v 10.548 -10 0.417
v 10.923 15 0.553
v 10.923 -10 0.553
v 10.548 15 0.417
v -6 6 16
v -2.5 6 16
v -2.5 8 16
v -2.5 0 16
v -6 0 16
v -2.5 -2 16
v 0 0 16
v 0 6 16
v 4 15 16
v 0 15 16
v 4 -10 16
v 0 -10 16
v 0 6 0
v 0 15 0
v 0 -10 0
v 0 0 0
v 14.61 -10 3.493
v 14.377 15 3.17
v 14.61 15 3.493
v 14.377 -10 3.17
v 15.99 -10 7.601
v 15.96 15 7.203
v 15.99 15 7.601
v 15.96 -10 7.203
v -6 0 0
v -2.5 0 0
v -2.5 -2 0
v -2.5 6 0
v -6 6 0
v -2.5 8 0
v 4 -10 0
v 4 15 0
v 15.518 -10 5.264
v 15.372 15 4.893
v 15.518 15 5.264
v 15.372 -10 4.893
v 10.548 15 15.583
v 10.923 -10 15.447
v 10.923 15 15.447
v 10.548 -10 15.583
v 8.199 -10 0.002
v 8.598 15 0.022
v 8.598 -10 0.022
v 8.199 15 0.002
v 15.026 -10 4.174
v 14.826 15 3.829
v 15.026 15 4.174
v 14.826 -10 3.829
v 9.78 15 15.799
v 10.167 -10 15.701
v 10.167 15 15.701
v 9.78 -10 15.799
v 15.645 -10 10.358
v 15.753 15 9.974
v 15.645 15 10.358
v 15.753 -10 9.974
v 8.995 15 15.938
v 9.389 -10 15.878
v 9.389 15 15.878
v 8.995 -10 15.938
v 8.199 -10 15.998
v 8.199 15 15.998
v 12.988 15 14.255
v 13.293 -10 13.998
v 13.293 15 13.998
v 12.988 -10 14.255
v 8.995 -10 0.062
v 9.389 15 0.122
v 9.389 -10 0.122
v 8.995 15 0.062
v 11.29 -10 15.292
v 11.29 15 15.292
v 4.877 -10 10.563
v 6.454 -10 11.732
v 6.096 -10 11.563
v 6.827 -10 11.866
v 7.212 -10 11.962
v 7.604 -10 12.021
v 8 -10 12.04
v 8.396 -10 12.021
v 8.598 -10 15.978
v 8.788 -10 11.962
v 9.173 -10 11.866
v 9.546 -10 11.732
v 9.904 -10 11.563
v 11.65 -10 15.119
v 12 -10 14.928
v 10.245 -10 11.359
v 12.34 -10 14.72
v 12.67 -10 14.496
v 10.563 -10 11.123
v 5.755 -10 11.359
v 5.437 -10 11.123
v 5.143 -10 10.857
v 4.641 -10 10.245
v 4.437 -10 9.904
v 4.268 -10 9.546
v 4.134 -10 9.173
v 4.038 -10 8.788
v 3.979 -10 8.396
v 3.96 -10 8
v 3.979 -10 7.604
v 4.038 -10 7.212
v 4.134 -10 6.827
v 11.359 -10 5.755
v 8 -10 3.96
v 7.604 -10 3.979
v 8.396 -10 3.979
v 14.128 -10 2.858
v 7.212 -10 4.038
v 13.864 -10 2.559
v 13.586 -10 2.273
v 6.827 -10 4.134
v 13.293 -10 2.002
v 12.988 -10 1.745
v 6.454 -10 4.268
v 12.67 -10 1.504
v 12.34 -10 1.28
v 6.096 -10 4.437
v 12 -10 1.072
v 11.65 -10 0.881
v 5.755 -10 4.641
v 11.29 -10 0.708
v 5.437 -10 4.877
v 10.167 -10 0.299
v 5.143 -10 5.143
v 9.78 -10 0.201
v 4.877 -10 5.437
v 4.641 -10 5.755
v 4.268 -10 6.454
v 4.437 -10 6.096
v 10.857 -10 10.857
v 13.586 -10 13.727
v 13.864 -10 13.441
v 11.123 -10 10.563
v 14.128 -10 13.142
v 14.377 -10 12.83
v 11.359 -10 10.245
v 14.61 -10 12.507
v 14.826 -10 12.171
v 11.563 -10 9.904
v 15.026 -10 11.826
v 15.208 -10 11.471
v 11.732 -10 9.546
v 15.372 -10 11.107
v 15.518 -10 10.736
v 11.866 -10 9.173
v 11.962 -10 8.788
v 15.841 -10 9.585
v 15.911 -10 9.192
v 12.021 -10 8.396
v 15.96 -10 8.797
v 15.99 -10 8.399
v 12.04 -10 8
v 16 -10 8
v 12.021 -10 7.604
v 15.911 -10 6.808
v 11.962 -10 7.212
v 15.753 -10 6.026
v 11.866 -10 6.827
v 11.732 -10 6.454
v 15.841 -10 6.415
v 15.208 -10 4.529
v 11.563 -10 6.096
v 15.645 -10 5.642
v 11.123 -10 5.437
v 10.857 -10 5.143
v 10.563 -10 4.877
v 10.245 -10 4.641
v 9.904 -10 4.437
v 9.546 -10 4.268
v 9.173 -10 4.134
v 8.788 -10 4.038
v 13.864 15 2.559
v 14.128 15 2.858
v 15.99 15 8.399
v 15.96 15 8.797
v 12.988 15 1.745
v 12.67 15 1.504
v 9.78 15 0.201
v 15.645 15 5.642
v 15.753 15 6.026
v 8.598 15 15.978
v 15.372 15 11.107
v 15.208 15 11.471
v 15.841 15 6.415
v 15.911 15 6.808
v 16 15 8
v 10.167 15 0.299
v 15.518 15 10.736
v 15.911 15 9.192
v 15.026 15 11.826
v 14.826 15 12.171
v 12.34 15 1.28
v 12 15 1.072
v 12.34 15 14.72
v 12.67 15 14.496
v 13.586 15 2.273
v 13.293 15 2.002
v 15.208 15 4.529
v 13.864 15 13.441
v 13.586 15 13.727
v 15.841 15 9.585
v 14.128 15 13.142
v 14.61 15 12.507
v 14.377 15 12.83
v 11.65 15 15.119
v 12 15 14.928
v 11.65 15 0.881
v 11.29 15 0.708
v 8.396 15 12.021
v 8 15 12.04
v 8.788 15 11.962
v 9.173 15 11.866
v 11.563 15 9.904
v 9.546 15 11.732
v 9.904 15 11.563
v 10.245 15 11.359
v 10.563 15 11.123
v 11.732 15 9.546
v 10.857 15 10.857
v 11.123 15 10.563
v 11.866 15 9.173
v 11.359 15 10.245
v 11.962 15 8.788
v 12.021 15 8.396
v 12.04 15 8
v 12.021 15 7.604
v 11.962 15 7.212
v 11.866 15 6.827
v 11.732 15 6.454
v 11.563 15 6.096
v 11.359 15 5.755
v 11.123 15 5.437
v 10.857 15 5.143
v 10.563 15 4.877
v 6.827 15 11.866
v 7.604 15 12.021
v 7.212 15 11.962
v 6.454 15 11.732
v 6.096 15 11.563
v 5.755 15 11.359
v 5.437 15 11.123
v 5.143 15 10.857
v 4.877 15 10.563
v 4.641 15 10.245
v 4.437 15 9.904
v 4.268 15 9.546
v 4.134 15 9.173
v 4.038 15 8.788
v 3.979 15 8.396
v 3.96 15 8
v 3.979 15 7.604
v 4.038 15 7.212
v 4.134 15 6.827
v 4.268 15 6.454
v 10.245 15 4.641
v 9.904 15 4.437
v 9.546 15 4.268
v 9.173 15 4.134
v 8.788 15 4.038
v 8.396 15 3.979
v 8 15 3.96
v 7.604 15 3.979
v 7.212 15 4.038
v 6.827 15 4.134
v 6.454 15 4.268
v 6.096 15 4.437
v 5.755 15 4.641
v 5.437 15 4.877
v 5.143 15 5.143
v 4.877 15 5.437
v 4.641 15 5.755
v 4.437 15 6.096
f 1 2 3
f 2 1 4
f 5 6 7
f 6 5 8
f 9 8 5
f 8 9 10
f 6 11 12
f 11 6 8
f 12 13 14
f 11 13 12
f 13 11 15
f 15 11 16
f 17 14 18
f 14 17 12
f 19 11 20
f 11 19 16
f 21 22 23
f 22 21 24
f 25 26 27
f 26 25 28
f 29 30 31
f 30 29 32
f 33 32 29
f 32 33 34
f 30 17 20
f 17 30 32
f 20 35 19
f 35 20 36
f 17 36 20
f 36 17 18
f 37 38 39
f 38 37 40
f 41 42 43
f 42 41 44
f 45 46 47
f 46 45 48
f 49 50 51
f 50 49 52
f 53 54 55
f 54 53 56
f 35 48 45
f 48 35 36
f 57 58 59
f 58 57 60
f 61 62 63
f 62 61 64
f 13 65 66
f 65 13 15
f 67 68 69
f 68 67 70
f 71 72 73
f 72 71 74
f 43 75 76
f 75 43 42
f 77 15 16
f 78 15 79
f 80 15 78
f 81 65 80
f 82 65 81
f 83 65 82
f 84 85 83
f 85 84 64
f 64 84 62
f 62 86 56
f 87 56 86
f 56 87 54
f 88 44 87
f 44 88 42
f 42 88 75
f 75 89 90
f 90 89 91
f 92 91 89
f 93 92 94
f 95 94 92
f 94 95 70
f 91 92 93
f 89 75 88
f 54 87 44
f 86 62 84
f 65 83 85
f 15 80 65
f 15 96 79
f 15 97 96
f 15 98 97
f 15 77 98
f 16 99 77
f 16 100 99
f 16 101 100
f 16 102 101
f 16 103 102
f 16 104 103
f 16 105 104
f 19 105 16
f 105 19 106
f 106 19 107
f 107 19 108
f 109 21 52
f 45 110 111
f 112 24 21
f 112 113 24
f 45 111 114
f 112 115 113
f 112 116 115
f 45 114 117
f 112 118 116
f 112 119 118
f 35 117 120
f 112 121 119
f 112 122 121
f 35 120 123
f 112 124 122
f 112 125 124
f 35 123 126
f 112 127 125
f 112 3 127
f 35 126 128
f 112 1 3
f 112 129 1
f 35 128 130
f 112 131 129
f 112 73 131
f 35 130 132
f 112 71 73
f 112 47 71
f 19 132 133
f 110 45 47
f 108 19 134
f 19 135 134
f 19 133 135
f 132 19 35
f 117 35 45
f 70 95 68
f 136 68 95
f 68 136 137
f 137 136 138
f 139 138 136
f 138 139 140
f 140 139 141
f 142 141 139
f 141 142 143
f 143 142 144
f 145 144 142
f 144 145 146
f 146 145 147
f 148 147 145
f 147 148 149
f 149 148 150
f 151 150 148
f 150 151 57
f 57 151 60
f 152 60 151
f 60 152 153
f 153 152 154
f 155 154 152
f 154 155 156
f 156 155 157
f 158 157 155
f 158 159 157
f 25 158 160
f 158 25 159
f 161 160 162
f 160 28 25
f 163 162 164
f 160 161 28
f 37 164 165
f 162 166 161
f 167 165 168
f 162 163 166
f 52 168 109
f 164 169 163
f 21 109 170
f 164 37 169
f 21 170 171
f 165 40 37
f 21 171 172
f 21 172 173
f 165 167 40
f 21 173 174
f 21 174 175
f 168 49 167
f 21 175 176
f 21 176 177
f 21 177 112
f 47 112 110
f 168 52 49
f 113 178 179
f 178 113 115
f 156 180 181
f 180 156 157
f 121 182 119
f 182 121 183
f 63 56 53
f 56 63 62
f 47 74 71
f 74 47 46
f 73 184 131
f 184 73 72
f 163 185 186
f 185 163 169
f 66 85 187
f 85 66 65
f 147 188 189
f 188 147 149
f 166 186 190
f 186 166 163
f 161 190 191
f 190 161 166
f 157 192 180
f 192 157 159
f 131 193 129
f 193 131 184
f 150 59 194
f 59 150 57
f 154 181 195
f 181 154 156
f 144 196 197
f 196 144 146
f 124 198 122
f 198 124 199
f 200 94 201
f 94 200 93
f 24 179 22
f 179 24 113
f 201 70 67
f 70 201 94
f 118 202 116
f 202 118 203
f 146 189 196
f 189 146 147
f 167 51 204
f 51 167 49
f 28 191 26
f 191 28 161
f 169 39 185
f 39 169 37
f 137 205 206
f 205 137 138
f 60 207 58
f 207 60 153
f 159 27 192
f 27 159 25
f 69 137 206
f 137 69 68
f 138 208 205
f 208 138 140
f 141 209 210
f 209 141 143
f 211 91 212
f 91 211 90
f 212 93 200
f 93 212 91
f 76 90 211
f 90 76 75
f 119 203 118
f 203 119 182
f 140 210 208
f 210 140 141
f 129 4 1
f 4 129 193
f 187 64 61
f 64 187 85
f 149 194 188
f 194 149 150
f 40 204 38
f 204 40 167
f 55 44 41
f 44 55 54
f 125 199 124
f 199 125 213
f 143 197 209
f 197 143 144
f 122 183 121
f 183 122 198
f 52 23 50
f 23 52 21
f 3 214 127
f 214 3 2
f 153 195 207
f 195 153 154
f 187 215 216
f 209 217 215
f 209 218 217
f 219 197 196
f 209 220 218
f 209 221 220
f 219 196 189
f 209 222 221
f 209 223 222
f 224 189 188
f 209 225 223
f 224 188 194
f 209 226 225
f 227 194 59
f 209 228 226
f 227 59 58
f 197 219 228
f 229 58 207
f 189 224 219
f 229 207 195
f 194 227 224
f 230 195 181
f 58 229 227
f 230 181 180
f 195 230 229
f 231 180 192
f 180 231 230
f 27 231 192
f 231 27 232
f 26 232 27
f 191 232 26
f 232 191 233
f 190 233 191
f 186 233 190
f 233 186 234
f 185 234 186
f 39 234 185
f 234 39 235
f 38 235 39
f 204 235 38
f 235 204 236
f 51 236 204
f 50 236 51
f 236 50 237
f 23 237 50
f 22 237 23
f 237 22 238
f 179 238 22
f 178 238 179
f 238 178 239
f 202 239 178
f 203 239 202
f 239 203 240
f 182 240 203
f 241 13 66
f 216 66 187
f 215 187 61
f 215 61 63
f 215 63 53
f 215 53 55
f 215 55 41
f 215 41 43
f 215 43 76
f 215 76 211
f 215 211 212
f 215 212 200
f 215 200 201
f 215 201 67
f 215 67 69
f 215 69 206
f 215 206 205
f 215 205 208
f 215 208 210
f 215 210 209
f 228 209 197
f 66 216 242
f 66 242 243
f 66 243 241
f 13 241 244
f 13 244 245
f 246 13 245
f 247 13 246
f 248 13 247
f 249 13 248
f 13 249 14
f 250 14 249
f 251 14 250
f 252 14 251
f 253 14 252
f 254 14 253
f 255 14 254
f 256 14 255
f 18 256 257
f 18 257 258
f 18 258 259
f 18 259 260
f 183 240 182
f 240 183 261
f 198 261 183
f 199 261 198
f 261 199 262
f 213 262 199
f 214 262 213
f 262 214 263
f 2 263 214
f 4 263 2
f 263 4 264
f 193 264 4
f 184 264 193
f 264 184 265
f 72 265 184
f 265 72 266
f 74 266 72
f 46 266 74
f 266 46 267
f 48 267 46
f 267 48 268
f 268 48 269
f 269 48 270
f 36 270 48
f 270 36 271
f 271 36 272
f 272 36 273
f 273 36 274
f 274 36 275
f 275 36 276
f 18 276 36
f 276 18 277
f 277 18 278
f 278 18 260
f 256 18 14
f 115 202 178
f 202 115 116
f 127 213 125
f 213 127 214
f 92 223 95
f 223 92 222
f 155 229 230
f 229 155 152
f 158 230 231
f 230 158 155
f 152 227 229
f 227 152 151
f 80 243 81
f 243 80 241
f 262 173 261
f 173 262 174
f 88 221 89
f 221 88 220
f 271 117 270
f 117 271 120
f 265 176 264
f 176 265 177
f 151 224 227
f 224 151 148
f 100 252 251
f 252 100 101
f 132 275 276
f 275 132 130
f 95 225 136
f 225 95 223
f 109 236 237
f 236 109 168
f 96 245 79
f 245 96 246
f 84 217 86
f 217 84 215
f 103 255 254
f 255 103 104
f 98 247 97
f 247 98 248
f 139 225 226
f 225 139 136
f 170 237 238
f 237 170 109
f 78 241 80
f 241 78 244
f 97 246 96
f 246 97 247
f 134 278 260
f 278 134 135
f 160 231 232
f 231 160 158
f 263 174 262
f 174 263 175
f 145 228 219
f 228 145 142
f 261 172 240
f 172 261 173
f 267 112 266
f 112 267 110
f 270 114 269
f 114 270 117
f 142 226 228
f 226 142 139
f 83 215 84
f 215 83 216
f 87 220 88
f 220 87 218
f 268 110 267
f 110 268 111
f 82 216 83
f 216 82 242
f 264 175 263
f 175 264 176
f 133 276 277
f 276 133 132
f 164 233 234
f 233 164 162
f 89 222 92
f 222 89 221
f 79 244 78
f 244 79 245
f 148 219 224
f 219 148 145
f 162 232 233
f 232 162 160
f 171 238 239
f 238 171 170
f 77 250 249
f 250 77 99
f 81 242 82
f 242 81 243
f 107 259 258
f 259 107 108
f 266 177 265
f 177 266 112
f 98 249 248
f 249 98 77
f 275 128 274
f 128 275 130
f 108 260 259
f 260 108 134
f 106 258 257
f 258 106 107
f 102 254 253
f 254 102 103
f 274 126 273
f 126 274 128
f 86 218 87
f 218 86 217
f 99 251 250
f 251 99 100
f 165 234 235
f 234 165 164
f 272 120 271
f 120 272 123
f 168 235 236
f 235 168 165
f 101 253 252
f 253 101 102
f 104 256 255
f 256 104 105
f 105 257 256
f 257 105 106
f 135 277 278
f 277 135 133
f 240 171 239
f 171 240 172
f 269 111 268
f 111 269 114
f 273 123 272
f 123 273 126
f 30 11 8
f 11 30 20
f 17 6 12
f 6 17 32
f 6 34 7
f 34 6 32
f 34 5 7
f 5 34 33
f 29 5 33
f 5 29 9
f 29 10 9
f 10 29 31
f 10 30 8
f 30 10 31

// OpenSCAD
$fa=1;
$fs=0.4;

module hook() {
    polygon([
        [0,0],
        [-2.5, 0],
        [-2.5, -2],
        [-6, 0],
        [-6, 6],
        [-2.5, 8],
        [-2.5, 6],
        [0, 6]
    ]);
}
height=16;
linear_extrude(height=height) hook();

difference() {
    hull() {
        translate([0,-10,0])
            cube([4, 25, height]);
        translate([8, 15, 8])
            rotate([90, 0, 0])
            rotate_extrude()
            translate([4, 0, 0])
            square([4, 25]);
    }
    translate([8, 17, 8])
        rotate([90, 0, 0])
        cylinder(30, 4.04, 4.04);
}
